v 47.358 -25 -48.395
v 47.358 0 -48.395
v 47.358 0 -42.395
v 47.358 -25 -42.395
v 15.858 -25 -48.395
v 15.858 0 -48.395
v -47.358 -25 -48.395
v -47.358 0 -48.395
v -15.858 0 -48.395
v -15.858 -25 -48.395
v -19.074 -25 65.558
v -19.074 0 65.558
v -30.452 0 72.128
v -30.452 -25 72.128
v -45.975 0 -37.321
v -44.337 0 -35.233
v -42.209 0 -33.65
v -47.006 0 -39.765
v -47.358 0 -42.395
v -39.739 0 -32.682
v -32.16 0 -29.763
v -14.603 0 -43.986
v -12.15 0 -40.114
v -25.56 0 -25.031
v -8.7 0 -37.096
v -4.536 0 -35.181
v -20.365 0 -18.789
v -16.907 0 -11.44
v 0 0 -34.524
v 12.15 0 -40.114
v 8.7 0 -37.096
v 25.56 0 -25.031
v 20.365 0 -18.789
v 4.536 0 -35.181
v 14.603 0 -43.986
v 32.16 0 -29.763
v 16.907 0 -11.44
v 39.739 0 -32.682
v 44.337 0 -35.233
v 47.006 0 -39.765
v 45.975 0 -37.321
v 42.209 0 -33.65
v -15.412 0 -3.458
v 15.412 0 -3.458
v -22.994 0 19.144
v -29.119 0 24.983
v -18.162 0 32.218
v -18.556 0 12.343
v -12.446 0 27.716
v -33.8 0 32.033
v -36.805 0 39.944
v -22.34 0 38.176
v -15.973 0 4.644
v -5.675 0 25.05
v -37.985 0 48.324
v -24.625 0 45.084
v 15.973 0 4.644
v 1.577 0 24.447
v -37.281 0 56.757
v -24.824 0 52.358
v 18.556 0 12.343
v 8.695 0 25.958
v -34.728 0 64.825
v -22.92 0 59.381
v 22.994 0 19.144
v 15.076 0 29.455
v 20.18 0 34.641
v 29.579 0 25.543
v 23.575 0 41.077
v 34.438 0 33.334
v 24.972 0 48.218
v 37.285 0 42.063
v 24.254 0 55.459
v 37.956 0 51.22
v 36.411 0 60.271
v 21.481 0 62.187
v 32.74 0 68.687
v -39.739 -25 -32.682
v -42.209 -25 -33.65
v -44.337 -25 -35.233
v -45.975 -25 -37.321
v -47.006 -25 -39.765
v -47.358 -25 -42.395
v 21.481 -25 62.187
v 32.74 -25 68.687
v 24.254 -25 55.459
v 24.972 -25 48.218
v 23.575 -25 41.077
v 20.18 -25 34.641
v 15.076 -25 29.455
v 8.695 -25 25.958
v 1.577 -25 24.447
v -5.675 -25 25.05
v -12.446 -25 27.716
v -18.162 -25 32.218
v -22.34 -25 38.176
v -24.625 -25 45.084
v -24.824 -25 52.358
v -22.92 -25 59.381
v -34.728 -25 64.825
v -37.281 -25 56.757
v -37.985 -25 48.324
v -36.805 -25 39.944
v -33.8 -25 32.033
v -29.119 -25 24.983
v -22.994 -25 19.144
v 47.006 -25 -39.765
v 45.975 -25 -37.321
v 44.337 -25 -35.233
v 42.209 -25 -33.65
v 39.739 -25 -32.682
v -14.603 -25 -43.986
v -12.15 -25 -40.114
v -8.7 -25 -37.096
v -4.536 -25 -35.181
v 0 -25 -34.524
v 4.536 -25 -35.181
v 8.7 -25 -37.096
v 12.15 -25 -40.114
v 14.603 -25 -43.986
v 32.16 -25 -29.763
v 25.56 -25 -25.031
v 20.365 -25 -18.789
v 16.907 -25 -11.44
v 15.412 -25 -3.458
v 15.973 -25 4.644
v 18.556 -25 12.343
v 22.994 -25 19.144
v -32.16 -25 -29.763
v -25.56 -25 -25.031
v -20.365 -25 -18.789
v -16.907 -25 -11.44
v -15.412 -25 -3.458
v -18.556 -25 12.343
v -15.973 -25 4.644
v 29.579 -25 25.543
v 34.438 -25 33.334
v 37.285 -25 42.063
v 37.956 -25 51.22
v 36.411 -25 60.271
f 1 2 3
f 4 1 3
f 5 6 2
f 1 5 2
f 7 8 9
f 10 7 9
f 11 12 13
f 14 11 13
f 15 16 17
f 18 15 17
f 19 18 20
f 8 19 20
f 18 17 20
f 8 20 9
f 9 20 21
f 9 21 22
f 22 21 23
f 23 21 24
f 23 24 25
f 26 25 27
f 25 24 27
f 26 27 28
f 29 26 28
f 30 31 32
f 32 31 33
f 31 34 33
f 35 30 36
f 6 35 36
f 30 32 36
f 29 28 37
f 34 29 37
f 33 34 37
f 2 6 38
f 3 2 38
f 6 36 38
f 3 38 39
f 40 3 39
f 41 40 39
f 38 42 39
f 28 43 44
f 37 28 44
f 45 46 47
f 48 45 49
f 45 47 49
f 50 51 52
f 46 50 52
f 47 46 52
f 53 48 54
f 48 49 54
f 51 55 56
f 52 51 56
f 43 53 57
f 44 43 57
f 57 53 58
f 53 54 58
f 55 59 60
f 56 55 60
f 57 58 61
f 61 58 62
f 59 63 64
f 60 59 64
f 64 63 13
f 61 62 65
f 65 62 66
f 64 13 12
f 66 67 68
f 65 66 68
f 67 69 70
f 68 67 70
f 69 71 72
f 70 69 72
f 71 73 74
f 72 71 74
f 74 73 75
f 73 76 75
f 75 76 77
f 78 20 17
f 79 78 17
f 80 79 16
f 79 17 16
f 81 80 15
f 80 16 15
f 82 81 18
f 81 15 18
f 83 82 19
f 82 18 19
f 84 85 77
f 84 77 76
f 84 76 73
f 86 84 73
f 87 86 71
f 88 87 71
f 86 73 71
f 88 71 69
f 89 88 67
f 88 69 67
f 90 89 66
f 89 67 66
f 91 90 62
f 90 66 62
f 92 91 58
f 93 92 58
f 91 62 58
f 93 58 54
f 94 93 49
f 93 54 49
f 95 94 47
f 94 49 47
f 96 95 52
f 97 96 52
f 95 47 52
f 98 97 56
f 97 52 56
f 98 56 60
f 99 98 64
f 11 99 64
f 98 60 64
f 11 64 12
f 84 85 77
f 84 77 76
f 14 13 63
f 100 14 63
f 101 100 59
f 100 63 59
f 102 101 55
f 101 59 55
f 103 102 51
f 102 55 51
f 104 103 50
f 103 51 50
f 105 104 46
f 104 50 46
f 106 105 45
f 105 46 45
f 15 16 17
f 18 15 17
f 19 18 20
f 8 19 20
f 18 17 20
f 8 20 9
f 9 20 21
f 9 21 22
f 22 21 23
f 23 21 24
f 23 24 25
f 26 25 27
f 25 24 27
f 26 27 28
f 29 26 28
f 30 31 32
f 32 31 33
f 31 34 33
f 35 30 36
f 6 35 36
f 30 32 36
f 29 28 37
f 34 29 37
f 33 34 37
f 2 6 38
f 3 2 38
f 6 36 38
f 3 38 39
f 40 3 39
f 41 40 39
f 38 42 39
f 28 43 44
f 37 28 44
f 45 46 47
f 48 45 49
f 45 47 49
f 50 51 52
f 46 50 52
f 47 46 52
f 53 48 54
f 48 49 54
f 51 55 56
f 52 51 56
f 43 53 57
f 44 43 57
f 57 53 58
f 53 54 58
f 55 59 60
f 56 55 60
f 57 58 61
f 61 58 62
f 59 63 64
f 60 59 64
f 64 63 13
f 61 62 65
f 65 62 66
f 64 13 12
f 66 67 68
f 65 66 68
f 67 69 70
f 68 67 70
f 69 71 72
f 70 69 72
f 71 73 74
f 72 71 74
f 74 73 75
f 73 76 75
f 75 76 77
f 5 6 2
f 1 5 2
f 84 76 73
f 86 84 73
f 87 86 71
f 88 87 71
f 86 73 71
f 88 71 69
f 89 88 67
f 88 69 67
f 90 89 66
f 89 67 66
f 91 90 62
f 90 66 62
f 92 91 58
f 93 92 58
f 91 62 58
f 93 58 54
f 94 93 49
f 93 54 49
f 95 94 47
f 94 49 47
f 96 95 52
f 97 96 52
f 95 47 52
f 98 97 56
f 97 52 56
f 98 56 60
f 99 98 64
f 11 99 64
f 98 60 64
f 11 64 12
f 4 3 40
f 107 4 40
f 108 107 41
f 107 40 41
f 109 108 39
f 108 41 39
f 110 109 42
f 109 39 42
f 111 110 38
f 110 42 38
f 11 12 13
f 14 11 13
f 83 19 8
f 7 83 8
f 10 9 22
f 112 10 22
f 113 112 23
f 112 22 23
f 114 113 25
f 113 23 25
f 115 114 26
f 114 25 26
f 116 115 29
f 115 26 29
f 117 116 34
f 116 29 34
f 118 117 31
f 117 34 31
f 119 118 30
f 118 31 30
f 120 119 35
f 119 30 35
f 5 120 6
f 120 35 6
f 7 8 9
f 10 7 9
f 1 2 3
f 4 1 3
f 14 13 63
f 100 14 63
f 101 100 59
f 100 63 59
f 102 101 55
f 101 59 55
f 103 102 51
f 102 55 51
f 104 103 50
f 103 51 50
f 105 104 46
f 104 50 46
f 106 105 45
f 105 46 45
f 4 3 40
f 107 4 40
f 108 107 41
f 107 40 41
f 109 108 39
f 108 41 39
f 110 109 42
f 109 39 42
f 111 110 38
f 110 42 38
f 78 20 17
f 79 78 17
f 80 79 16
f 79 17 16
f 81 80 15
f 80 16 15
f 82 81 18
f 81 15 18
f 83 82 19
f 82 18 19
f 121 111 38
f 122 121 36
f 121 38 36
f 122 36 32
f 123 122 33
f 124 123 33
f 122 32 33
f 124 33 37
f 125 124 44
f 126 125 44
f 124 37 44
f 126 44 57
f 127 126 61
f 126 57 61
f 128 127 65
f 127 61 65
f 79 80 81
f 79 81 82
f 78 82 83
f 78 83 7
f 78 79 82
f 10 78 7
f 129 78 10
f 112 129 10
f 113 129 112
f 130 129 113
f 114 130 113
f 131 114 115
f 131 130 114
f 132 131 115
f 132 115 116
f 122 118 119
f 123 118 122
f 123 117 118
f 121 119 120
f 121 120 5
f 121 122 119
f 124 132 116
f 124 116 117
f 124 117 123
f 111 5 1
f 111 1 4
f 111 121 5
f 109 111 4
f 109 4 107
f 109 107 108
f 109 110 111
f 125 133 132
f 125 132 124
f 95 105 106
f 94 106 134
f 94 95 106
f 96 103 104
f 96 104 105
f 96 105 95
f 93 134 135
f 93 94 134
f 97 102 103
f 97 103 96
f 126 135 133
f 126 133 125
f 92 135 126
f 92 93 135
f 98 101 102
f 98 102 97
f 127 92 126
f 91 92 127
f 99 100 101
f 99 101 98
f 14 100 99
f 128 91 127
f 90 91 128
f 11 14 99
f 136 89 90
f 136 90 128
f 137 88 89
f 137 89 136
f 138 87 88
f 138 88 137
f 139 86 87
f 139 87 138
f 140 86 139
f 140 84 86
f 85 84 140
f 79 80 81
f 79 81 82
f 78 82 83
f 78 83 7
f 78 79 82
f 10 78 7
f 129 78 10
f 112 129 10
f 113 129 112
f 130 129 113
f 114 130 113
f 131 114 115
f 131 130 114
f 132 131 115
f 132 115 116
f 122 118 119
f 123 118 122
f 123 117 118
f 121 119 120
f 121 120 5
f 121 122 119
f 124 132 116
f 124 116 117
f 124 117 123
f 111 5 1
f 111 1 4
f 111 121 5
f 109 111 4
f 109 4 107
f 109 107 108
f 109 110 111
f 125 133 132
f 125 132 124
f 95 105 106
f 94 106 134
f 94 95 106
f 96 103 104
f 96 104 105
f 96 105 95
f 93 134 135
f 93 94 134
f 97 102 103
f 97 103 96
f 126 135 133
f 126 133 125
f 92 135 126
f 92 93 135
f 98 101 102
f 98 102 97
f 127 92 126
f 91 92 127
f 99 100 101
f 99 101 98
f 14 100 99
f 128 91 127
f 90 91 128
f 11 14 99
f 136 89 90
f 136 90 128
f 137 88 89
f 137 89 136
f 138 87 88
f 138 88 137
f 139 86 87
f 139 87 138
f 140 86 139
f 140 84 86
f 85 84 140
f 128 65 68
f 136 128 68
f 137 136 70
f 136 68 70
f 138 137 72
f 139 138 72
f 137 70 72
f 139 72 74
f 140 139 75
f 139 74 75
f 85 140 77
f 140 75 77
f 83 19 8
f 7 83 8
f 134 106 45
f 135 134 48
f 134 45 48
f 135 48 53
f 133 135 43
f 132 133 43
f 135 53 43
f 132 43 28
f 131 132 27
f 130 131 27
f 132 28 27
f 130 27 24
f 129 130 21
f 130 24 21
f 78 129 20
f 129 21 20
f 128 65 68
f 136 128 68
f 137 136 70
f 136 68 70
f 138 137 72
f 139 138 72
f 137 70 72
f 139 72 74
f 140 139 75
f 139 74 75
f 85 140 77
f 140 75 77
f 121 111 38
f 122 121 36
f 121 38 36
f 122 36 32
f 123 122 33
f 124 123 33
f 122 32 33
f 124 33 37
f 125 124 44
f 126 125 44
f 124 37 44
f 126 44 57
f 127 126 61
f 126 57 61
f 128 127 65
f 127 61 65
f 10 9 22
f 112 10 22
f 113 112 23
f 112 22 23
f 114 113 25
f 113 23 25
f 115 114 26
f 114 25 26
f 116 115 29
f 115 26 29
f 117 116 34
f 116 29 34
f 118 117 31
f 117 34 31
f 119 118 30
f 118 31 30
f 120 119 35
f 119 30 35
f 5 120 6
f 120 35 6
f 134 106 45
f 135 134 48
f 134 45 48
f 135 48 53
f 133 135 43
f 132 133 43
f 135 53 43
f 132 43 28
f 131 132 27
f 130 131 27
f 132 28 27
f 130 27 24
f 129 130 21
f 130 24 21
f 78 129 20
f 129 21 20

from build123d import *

# Parameters (mm, degrees)
F1_DEPTH = 25
F2_DEPTH = 25


with BuildPart() as f1:
    # F0 (on Front) → F1 (new body)
    with BuildSketch(Plane.XZ):
        with BuildLine():
            Line((-19.074309, 65.558379), (-30.452423, 72.127536))
            ThreePointArc((-30.452423, 72.127536), (-37.629021, 44.100733), (-22.994201, 19.144225))
            ThreePointArc((-22.994201, 19.144225), (-16.907476, -11.440439), (-39.738601, -32.682137))
            ThreePointArc((-39.738601, -32.682137), (-45.225606, -36.222421), (-47.357648, -42.394555))
            Line((-47.357648, -42.394555), (-47.357648, -48.394555))
            Line((-47.357648, -48.394555), (-15.857648, -48.394555))
            ThreePointArc((-15.857648, -48.394555), (0, -34.524107), (15.857648, -48.394555))
            Line((15.857648, -48.394555), (47.357648, -48.394555))
            Line((47.357648, -48.394555), (47.357648, -42.394555))
            ThreePointArc((47.357648, -42.394555), (45.225606, -36.222421), (39.738601, -32.682137))
            ThreePointArc((39.738601, -32.682137), (16.907476, -11.440439), (22.994201, 19.144225))
            ThreePointArc((22.994201, 19.144225), (37.285422, 42.062935), (32.740113, 68.687105))
            Line((32.740113, 68.687105), (21.481118, 62.186721))
            ThreePointArc((21.481118, 62.186721), (-2.07128, 24.483553), (-19.074309, 65.558379))
        make_face()
    extrude(amount=F1_DEPTH)


with BuildPart() as f2:
    # F0 (on Front) → F2 (new body)
    with BuildSketch(Plane.XZ):
        with BuildLine():
            Line((-19.074309, 65.558379), (-30.452423, 72.127536))
            ThreePointArc((-30.452423, 72.127536), (-37.629021, 44.100733), (-22.994201, 19.144225))
            ThreePointArc((-22.994201, 19.144225), (-16.907476, -11.440439), (-39.738601, -32.682137))
            ThreePointArc((-39.738601, -32.682137), (-45.225606, -36.222421), (-47.357648, -42.394555))
            Line((-47.357648, -42.394555), (-47.357648, -48.394555))
            Line((-47.357648, -48.394555), (-15.857648, -48.394555))
            ThreePointArc((-15.857648, -48.394555), (0, -34.524107), (15.857648, -48.394555))
            Line((15.857648, -48.394555), (47.357648, -48.394555))
            Line((47.357648, -48.394555), (47.357648, -42.394555))
            ThreePointArc((47.357648, -42.394555), (45.225606, -36.222421), (39.738601, -32.682137))
            ThreePointArc((39.738601, -32.682137), (16.907476, -11.440439), (22.994201, 19.144225))
            ThreePointArc((22.994201, 19.144225), (37.285422, 42.062935), (32.740113, 68.687105))
            Line((32.740113, 68.687105), (21.481118, 62.186721))
            ThreePointArc((21.481118, 62.186721), (-2.07128, 24.483553), (-19.074309, 65.558379))
        make_face()
    extrude(amount=F2_DEPTH)


solid = Compound([f1.part, f2.part])
